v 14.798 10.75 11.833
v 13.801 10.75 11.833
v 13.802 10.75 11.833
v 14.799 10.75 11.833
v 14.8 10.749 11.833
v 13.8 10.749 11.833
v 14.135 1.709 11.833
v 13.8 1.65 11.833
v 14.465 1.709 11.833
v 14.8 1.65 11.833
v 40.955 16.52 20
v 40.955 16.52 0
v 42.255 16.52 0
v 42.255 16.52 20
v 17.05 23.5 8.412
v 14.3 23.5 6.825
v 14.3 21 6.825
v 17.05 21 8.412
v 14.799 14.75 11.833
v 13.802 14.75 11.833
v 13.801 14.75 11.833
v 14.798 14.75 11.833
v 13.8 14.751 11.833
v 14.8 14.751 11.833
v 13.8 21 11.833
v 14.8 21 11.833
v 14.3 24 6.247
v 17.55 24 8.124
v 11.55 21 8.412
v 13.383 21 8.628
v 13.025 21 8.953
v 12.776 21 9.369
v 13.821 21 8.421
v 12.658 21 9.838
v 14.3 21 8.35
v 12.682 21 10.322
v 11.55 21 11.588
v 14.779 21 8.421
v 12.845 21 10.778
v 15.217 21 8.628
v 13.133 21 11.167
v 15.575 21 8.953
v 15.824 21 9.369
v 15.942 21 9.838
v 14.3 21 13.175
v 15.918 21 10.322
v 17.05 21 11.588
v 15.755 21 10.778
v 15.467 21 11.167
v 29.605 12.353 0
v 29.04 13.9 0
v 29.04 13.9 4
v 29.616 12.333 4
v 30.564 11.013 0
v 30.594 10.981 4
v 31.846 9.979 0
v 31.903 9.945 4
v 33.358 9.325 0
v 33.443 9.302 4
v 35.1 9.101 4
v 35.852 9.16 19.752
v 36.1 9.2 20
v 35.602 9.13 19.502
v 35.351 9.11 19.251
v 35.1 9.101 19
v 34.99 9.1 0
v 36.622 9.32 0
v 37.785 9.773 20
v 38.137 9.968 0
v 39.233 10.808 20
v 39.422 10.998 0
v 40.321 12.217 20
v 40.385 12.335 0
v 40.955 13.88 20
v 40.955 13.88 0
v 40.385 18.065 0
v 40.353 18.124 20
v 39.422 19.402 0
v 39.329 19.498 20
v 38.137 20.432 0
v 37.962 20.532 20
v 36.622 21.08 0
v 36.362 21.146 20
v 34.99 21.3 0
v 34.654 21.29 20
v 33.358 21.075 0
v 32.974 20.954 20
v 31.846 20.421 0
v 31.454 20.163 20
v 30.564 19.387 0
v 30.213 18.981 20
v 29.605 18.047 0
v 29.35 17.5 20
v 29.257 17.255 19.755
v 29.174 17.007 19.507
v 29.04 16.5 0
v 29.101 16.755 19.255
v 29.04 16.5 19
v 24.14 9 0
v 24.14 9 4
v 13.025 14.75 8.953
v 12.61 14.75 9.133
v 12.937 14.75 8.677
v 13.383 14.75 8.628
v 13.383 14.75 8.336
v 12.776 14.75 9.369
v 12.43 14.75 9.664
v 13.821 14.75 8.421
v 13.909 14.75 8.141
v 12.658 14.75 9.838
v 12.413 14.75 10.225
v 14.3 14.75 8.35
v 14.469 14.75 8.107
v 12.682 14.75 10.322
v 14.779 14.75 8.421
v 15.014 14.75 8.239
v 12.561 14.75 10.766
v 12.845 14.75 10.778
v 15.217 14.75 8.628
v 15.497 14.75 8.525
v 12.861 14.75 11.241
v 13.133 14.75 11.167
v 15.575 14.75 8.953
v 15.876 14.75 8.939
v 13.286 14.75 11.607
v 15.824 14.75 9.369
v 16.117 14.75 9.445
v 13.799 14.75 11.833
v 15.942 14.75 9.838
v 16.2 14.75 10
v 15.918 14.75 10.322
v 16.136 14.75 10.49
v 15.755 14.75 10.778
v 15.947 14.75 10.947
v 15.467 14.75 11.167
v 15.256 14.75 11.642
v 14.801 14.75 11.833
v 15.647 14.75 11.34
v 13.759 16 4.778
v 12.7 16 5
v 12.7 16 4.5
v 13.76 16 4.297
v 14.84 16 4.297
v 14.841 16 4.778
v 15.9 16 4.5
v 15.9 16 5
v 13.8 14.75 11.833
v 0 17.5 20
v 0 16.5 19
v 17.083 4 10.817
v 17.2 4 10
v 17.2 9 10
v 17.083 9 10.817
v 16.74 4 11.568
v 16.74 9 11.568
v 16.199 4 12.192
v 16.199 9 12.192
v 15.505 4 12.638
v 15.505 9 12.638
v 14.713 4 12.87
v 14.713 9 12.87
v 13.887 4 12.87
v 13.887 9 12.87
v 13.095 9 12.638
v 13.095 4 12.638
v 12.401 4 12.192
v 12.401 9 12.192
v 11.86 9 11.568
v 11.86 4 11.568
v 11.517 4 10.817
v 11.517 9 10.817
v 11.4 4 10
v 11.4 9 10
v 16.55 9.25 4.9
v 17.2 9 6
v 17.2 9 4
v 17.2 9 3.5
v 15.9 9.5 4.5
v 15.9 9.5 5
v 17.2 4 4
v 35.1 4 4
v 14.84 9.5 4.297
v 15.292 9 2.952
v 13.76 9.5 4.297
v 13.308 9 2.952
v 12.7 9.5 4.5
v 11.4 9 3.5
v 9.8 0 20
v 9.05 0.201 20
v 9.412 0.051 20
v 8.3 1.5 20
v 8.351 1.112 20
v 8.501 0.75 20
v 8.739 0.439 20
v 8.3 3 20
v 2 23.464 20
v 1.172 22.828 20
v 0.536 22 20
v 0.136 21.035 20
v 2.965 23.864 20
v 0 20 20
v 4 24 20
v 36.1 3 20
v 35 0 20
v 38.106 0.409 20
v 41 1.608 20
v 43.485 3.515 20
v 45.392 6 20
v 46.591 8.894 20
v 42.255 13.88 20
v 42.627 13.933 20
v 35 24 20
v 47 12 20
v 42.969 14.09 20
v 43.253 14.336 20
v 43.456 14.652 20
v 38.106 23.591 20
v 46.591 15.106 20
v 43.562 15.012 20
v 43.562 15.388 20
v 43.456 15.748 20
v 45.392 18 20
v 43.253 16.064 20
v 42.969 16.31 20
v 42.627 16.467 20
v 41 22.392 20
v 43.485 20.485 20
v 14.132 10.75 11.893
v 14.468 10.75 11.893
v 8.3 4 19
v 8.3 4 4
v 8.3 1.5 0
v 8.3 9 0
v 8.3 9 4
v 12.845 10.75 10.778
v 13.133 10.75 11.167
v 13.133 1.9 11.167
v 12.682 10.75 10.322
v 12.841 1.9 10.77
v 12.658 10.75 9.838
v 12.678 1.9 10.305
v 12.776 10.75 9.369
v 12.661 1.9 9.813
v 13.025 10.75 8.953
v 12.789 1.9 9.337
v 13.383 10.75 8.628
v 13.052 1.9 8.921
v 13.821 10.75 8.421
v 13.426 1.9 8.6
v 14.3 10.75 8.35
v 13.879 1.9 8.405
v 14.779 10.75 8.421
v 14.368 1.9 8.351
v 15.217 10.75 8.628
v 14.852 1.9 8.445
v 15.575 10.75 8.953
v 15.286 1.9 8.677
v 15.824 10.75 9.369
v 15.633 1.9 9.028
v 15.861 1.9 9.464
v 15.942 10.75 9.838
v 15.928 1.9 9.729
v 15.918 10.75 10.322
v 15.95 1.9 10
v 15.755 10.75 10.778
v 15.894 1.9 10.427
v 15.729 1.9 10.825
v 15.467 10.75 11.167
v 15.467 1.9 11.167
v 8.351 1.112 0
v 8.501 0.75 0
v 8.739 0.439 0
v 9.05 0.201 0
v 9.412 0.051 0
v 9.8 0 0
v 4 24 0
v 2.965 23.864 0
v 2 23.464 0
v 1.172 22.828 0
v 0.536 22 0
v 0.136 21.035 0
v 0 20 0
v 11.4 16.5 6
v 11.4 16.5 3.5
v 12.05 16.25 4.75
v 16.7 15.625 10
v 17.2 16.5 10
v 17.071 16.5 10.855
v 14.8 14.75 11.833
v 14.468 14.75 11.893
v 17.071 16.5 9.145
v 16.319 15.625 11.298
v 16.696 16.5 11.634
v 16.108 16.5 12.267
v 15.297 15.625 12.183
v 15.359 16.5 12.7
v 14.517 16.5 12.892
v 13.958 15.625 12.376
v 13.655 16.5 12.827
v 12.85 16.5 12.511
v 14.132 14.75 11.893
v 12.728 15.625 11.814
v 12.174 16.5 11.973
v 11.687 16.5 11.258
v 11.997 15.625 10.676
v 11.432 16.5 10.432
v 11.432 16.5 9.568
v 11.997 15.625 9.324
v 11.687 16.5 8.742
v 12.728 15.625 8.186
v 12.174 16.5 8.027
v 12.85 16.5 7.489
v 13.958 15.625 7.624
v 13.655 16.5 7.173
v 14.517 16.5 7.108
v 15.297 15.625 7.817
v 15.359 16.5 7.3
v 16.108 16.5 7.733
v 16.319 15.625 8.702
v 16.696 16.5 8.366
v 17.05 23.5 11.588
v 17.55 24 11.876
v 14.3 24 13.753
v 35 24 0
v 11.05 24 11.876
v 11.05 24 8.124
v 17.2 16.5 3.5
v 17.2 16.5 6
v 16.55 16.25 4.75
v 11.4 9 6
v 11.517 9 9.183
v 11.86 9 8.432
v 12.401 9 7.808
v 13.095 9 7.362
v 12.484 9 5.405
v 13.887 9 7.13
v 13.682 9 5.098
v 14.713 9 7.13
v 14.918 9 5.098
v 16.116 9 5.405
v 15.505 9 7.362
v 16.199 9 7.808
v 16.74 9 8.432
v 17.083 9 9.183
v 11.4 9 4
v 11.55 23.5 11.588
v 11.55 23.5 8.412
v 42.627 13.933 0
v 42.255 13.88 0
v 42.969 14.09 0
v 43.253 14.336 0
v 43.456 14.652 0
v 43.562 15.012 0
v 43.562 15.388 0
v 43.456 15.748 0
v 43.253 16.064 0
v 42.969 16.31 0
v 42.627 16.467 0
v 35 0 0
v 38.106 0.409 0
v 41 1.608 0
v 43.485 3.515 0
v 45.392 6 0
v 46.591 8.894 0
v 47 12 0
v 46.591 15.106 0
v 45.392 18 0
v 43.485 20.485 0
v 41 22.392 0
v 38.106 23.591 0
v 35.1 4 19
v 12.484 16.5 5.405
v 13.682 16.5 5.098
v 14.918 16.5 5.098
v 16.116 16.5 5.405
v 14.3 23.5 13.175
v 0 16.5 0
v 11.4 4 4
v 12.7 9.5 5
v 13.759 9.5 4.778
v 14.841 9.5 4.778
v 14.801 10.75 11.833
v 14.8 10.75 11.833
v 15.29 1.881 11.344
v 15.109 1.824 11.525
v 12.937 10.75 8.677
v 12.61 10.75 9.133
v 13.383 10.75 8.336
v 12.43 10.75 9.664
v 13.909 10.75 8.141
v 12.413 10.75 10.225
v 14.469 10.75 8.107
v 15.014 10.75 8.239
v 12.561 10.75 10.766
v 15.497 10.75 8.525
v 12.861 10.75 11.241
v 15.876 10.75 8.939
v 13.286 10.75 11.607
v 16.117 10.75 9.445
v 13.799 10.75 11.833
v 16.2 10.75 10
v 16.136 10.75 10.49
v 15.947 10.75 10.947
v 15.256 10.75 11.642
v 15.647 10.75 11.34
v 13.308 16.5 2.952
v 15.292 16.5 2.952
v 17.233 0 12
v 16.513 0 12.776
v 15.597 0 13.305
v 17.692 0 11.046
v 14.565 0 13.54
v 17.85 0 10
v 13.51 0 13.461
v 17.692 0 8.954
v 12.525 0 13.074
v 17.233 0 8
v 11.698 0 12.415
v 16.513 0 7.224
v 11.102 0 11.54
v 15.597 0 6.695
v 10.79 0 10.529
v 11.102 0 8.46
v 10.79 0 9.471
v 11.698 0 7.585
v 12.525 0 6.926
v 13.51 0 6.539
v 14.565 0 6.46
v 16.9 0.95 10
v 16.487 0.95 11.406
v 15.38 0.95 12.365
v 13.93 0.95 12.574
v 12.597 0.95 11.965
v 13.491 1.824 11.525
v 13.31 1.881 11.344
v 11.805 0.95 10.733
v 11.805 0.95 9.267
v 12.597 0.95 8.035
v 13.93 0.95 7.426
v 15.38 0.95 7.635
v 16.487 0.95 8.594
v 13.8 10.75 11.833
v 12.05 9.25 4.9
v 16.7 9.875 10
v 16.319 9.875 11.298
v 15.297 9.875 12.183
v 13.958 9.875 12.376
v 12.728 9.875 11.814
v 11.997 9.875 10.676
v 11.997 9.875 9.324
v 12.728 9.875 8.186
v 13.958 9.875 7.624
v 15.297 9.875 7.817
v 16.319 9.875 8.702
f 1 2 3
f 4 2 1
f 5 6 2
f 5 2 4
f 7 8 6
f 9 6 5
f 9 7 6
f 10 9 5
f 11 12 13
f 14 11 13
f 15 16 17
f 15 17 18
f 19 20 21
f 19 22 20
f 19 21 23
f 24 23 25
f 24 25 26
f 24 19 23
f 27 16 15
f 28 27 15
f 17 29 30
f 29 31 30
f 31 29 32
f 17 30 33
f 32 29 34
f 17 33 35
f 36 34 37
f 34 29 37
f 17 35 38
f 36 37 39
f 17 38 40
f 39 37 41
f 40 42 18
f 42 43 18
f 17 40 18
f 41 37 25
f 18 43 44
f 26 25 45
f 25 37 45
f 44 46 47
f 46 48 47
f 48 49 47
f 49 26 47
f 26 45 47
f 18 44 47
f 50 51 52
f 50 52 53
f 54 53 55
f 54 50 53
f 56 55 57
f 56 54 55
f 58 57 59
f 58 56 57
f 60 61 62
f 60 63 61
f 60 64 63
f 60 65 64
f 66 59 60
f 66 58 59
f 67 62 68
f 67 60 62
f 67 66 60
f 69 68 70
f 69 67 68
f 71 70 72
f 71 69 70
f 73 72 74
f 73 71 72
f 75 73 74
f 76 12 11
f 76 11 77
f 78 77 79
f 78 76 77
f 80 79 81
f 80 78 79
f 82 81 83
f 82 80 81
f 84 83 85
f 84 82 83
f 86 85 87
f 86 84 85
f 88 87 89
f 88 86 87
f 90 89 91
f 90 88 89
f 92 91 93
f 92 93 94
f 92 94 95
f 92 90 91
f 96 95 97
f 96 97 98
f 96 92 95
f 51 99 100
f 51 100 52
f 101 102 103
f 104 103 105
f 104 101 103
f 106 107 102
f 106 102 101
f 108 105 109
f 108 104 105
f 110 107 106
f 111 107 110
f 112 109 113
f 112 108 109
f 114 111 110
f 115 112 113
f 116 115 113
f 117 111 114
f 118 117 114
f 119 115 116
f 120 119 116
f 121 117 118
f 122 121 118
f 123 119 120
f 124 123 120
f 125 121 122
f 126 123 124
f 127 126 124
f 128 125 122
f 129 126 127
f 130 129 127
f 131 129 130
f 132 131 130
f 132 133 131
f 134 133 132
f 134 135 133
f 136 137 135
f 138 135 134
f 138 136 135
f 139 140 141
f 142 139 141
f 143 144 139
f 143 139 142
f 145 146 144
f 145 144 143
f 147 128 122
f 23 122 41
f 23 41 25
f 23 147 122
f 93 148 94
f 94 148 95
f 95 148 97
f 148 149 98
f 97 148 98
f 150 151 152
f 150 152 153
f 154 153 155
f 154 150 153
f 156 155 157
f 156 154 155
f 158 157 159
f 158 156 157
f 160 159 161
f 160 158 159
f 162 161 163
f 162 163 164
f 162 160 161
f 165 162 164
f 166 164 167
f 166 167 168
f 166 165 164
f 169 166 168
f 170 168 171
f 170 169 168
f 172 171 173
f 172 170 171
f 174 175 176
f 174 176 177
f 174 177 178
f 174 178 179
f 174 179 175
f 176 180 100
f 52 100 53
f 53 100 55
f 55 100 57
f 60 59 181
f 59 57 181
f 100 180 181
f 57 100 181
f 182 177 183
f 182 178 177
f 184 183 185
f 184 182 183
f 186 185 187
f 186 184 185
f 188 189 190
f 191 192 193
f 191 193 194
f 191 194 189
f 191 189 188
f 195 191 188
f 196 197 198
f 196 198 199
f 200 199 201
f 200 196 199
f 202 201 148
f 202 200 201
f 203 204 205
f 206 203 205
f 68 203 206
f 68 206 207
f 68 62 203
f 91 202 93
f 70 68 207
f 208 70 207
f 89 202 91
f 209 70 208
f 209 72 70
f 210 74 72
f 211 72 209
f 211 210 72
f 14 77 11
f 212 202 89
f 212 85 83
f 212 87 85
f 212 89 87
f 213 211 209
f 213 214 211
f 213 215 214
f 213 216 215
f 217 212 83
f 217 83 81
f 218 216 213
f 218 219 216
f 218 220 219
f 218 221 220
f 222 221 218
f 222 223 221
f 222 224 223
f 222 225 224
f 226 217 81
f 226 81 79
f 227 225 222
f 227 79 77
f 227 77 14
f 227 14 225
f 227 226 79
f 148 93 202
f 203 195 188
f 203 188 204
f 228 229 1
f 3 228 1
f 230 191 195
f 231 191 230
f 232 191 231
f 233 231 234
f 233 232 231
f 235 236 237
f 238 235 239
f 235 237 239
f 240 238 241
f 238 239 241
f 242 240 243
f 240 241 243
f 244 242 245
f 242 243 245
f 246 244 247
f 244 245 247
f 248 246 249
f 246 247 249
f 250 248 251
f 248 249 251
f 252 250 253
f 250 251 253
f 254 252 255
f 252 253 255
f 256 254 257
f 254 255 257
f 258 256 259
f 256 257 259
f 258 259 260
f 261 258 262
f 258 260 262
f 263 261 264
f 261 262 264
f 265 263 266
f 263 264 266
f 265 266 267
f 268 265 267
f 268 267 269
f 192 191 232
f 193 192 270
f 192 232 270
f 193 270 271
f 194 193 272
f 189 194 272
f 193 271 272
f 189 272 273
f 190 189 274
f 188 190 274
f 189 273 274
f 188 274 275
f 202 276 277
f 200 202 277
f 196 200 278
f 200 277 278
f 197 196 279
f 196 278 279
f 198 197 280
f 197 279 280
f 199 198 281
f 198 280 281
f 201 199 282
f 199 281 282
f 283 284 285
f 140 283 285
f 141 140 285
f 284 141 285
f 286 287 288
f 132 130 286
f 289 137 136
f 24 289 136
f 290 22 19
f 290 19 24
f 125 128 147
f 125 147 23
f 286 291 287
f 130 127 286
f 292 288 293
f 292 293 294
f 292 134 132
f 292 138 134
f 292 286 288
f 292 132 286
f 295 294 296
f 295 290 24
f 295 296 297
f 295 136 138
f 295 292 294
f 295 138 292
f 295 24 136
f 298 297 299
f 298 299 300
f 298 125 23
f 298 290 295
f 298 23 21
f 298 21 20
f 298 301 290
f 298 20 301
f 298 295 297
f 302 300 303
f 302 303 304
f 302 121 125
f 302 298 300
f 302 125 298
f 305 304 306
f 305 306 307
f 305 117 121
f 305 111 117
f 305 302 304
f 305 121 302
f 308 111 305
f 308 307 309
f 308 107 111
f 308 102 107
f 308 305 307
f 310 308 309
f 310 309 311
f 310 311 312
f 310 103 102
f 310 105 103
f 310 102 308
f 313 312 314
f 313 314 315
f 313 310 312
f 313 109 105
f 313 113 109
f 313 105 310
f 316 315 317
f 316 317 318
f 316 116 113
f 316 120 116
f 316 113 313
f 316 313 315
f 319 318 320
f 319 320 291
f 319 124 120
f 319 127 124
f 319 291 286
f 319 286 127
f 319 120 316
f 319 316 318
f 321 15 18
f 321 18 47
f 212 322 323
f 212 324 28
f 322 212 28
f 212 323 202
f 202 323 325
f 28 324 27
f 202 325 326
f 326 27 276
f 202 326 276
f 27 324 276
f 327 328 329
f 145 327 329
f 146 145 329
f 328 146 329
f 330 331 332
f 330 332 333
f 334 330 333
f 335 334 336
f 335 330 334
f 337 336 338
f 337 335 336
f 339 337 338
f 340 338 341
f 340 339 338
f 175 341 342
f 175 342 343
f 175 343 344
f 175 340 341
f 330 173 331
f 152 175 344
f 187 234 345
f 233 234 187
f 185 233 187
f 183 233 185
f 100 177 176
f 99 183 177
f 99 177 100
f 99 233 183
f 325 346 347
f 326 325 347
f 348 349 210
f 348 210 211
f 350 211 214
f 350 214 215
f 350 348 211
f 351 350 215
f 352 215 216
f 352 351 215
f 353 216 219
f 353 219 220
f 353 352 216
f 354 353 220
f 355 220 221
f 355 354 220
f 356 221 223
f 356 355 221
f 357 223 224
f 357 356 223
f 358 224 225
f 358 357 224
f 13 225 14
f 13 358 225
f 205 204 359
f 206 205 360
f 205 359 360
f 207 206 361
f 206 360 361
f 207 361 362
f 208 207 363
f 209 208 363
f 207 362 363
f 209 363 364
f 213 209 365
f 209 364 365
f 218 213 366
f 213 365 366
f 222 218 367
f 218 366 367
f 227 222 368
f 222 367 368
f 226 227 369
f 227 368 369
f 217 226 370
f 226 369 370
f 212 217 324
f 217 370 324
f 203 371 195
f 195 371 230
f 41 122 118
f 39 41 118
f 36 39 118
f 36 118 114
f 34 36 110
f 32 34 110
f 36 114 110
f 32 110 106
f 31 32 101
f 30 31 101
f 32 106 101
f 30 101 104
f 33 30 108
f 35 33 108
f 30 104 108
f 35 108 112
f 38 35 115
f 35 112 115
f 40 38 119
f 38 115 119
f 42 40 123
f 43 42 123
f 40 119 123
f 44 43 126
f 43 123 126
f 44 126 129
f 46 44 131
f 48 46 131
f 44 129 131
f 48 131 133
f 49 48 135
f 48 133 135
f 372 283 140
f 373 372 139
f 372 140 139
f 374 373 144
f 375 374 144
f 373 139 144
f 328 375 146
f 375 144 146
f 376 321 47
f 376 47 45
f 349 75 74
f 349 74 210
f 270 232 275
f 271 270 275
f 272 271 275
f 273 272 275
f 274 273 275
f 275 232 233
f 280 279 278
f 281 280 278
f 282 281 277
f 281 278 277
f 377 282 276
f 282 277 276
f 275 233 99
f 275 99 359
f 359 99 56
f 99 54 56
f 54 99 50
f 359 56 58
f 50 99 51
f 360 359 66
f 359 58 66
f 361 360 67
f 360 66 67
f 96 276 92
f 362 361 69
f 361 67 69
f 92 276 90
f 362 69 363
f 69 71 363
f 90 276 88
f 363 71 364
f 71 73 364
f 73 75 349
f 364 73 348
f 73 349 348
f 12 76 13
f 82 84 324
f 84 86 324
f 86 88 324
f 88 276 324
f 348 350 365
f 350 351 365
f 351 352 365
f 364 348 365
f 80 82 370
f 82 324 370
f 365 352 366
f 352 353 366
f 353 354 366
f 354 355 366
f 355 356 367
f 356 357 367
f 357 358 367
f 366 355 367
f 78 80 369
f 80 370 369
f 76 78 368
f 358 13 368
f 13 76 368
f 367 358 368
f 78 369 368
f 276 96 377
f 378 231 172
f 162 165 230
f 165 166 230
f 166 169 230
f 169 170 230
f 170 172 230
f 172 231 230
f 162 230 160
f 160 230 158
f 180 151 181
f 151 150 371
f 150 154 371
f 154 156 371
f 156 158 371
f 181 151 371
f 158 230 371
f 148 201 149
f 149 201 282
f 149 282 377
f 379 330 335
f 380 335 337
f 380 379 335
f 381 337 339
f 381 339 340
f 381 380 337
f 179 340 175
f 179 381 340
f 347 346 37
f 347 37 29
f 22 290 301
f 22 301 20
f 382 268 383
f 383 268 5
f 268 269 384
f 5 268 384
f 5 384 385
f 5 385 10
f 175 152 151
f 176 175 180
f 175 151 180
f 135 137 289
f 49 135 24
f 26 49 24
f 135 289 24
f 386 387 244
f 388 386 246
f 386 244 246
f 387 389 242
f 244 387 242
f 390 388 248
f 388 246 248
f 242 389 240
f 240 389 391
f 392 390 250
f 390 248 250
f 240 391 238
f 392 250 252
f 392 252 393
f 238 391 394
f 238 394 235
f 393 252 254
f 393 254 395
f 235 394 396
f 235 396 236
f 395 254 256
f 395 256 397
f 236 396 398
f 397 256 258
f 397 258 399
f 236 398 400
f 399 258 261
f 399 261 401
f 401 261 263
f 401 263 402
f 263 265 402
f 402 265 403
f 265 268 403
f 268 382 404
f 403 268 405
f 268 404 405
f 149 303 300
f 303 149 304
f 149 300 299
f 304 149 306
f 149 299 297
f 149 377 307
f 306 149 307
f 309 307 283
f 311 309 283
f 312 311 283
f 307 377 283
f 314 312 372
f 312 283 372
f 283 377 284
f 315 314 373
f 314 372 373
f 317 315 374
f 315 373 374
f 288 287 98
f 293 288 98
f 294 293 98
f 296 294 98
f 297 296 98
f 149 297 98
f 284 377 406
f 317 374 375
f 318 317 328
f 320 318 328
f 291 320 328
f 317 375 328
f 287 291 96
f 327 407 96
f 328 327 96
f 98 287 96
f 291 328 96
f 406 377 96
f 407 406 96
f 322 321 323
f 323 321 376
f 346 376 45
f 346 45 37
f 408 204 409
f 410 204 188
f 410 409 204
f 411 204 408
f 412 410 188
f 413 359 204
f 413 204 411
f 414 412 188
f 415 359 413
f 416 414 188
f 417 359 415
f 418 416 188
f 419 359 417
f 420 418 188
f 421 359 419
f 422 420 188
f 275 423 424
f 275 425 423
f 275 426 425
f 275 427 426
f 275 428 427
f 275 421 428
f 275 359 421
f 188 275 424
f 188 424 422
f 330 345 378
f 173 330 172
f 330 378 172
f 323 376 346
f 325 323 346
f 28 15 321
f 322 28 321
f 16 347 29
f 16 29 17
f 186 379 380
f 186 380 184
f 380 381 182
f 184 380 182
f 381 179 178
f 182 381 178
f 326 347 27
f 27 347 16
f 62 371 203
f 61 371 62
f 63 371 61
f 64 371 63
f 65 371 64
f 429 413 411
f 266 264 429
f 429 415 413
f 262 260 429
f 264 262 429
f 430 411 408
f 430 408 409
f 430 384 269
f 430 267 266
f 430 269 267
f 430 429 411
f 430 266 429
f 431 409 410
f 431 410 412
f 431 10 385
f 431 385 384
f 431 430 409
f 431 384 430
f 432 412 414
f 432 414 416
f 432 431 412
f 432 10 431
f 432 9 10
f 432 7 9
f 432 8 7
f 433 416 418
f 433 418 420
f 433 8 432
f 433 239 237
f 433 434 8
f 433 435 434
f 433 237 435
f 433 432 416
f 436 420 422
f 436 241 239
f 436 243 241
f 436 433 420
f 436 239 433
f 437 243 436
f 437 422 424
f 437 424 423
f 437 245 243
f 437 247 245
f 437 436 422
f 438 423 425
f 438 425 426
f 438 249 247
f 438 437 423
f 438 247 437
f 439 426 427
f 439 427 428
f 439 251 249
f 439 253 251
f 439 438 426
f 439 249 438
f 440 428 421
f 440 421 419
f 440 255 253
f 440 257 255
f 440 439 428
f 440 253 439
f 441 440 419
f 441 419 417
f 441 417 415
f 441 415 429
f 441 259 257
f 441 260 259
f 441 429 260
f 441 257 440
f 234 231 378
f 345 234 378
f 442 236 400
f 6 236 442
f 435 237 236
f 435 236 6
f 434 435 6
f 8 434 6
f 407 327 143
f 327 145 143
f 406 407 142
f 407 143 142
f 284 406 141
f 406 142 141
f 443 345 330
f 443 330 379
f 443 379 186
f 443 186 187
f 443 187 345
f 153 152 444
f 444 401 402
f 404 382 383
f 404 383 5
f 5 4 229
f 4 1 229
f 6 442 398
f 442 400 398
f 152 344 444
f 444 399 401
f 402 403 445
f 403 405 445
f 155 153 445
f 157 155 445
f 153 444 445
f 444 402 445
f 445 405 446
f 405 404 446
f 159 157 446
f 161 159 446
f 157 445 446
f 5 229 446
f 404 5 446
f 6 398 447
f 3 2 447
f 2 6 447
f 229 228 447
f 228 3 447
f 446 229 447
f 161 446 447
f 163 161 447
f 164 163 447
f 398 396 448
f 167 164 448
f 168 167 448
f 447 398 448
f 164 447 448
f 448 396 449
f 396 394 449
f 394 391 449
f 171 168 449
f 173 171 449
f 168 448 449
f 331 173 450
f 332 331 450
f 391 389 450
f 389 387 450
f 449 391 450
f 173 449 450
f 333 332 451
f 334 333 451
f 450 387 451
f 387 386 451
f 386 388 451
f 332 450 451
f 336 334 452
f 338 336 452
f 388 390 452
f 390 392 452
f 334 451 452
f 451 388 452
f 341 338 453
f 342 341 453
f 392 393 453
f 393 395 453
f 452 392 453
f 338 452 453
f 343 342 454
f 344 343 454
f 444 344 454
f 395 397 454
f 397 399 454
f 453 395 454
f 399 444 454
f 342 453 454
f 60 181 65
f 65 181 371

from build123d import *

# Parameters (mm, degrees)
PAD_DEPTH       = 20
POCKET_DEPTH    = 12
SKETCH002_R     = 2.9
SKETCH003_R     = 1.9
SKETCH004_R     = 2.9
SKETCH005_R     = 1.9
POCKET001_DEPTH = 24.001
POCKET002_DEPTH = 3
SKETCH012_R     = 3.55
SKETCH013_R     = 1.5
CHAMFER_SIZE    = 0.5
CHAMFER001_SIZE = 1


with BuildPart() as part:
    # Sketch → Pad (new body)
    with BuildSketch(Plane.XY):
        with BuildLine():
            ThreePointArc((35, 0), (47, 12), (35, 24))
            Line((35, 24), (4, 24))
            ThreePointArc((4, 24), (1.171573, 22.828427), (0, 20))
            Line((0, 20), (0, 16.5))
            Line((0, 16.5), (29.040134, 16.5))
            ThreePointArc((40.955468, 16.52), (34.989761, 21.299991), (29.040134, 16.5))
            Line((40.955468, 16.52), (42.255468, 16.52))
            ThreePointArc((42.255468, 13.88), (43.575468, 15.2), (42.255468, 16.52))
            Line((40.955468, 13.88), (42.255468, 13.88))
            ThreePointArc((29.040134, 13.9), (34.989761, 9.100009), (40.955468, 13.88))
            Line((24.140134, 9), (29.040134, 13.9))
            Line((8.3, 9), (24.140134, 9))
            Line((8.3, 1.5), (8.3, 9))
            ThreePointArc((8.3, 1.5), (8.73934, 0.43934), (9.8, 0))
            Line((35, 0), (9.8, 0))
        make_face()
    extrude(amount=PAD_DEPTH)

    # Sketch001 → Pocket (cut)
    with BuildSketch(Plane.XZ.offset(-4)):
        with BuildLine():
            Line((17.2, 10), (17.2, 4))
            Line((17.2, 4), (35.1, 4))
            Line((35.1, 4), (35.1, 20))
            Line((35.1, 20), (0, 20))
            Line((0, 20), (0, 4))
            Line((0, 4), (11.4, 4))
            Line((11.4, 4), (11.4, 10))
            ThreePointArc((17.2, 10), (14.3, 12.9), (11.4, 10))
        make_face()
    extrude(amount=-POCKET_DEPTH, mode=Mode.SUBTRACT)

    # Sketch002 → AdditiveLoft section 0
    with BuildSketch(Plane.XZ.offset(-9)):
        with Locations((14.3, 10)):
            Circle(SKETCH002_R)
    # Sketch003 → AdditiveLoft section 1
    with BuildSketch(Plane.XZ.offset(-10.75)):
        with Locations((14.3, 10)):
            Circle(SKETCH003_R)
    loft()

    # Sketch004 → AdditiveLoft001 section 0
    with BuildSketch(Plane.XZ.offset(-16.5)):
        with Locations((14.3, 10)):
            Circle(SKETCH004_R)
    # Sketch005 → AdditiveLoft001 section 1
    with BuildSketch(Plane.XZ.offset(-14.75)):
        with Locations((14.3, 10)):
            Circle(SKETCH005_R)
    loft()

    # Sketch006 → AdditiveLoft002 section 0
    with BuildSketch(Plane.XZ.offset(-9)):
        with BuildLine():
            ThreePointArc((11.4, 6), (14.3, 5.059352), (17.2, 6))
            Line((17.2, 6), (17.2, 3.5))
            ThreePointArc((11.4, 3.5), (14.3, 2.882416), (17.2, 3.5))
            Line((11.4, 6), (11.4, 3.5))
        make_face()
    # Sketch007 → AdditiveLoft002 section 1
    with BuildSketch(Plane.XZ.offset(-9.5)):
        with BuildLine():
            ThreePointArc((12.7, 5), (14.3, 4.750238), (15.9, 5))
            Line((15.9, 5), (15.9, 4.5))
            ThreePointArc((12.7, 4.5), (14.3, 4.271999), (15.9, 4.5))
            Line((12.7, 5), (12.7, 4.5))
        make_face()
    loft()

    # Sketch008 → AdditiveLoft003 section 0
    with BuildSketch(Plane.XZ.offset(-16.5)):
        with BuildLine():
            ThreePointArc((11.4, 6), (14.3, 5.059352), (17.2, 6))
            Line((17.2, 6), (17.2, 3.5))
            ThreePointArc((11.4, 3.5), (14.3, 2.882416), (17.2, 3.5))
            Line((11.4, 6), (11.4, 3.5))
        make_face()
    # Sketch009 → AdditiveLoft003 section 1
    with BuildSketch(Plane.XZ.offset(-16)):
        with BuildLine():
            ThreePointArc((12.7, 5), (14.3, 4.750238), (15.9, 5))
            Line((15.9, 5), (15.9, 4.5))
            ThreePointArc((12.7, 4.5), (14.3, 4.271999), (15.9, 4.5))
            Line((12.7, 5), (12.7, 4.5))
        make_face()
    loft()

    # Sketch010 → Pocket001 (cut, through all)
    with BuildSketch(Plane.XZ):
        with BuildLine():
            ThreePointArc((13.133274, 11.166726), (14.3, 8.35), (15.466726, 11.166726))
            Line((15.466726, 11.166726), (14.8, 11.833452))
            Line((13.8, 11.833452), (14.8, 11.833452))
            Line((13.133274, 11.166726), (13.8, 11.833452))
        make_face()
    extrude(amount=-POCKET001_DEPTH, mode=Mode.SUBTRACT)

    # Sketch011 → Pocket002 (cut)
    with BuildSketch(Plane.XZ.offset(-24)):
        Polygon((11.55, 11.587713), (11.55, 8.412287), (14.3, 6.824574), (17.05, 8.412287), (17.05, 11.587713), (14.3, 13.175426), align=None)
    extrude(amount=POCKET002_DEPTH, mode=Mode.SUBTRACT)

    # Sketch012 → SubtractiveLoft section 0
    with BuildSketch(Plane.XZ):
        with Locations((14.3, 10)):
            Circle(SKETCH012_R)
    # Sketch013 → SubtractiveLoft section 1
    with BuildSketch(Plane.XZ.offset(-2.05)):
        with Locations((14.3, 10)):
            Circle(SKETCH013_R)
    loft(mode=Mode.SUBTRACT)

    # Chamfer
    chamfer_edges = [part.edges().sort_by_distance(p)[0] for p in [
        (15.675, 24, 7.61843),
        (17.05, 24, 10),
        (15.675, 24, 12.38157),
        (12.925, 24, 12.38157),
        (11.55, 24, 10),
        (12.925, 24, 7.61843),
    ]]
    chamfer(chamfer_edges, length=CHAMFER_SIZE)

    # Chamfer001
    chamfer001_edges = [part.edges().sort_by_distance(p)[0] for p in [
        (21.7, 4, 20),
        (35.1, 6.55041, 20),
        (14.520067, 16.5, 20),
    ]]
    chamfer(chamfer001_edges, length=CHAMFER001_SIZE)


solid = part.part
